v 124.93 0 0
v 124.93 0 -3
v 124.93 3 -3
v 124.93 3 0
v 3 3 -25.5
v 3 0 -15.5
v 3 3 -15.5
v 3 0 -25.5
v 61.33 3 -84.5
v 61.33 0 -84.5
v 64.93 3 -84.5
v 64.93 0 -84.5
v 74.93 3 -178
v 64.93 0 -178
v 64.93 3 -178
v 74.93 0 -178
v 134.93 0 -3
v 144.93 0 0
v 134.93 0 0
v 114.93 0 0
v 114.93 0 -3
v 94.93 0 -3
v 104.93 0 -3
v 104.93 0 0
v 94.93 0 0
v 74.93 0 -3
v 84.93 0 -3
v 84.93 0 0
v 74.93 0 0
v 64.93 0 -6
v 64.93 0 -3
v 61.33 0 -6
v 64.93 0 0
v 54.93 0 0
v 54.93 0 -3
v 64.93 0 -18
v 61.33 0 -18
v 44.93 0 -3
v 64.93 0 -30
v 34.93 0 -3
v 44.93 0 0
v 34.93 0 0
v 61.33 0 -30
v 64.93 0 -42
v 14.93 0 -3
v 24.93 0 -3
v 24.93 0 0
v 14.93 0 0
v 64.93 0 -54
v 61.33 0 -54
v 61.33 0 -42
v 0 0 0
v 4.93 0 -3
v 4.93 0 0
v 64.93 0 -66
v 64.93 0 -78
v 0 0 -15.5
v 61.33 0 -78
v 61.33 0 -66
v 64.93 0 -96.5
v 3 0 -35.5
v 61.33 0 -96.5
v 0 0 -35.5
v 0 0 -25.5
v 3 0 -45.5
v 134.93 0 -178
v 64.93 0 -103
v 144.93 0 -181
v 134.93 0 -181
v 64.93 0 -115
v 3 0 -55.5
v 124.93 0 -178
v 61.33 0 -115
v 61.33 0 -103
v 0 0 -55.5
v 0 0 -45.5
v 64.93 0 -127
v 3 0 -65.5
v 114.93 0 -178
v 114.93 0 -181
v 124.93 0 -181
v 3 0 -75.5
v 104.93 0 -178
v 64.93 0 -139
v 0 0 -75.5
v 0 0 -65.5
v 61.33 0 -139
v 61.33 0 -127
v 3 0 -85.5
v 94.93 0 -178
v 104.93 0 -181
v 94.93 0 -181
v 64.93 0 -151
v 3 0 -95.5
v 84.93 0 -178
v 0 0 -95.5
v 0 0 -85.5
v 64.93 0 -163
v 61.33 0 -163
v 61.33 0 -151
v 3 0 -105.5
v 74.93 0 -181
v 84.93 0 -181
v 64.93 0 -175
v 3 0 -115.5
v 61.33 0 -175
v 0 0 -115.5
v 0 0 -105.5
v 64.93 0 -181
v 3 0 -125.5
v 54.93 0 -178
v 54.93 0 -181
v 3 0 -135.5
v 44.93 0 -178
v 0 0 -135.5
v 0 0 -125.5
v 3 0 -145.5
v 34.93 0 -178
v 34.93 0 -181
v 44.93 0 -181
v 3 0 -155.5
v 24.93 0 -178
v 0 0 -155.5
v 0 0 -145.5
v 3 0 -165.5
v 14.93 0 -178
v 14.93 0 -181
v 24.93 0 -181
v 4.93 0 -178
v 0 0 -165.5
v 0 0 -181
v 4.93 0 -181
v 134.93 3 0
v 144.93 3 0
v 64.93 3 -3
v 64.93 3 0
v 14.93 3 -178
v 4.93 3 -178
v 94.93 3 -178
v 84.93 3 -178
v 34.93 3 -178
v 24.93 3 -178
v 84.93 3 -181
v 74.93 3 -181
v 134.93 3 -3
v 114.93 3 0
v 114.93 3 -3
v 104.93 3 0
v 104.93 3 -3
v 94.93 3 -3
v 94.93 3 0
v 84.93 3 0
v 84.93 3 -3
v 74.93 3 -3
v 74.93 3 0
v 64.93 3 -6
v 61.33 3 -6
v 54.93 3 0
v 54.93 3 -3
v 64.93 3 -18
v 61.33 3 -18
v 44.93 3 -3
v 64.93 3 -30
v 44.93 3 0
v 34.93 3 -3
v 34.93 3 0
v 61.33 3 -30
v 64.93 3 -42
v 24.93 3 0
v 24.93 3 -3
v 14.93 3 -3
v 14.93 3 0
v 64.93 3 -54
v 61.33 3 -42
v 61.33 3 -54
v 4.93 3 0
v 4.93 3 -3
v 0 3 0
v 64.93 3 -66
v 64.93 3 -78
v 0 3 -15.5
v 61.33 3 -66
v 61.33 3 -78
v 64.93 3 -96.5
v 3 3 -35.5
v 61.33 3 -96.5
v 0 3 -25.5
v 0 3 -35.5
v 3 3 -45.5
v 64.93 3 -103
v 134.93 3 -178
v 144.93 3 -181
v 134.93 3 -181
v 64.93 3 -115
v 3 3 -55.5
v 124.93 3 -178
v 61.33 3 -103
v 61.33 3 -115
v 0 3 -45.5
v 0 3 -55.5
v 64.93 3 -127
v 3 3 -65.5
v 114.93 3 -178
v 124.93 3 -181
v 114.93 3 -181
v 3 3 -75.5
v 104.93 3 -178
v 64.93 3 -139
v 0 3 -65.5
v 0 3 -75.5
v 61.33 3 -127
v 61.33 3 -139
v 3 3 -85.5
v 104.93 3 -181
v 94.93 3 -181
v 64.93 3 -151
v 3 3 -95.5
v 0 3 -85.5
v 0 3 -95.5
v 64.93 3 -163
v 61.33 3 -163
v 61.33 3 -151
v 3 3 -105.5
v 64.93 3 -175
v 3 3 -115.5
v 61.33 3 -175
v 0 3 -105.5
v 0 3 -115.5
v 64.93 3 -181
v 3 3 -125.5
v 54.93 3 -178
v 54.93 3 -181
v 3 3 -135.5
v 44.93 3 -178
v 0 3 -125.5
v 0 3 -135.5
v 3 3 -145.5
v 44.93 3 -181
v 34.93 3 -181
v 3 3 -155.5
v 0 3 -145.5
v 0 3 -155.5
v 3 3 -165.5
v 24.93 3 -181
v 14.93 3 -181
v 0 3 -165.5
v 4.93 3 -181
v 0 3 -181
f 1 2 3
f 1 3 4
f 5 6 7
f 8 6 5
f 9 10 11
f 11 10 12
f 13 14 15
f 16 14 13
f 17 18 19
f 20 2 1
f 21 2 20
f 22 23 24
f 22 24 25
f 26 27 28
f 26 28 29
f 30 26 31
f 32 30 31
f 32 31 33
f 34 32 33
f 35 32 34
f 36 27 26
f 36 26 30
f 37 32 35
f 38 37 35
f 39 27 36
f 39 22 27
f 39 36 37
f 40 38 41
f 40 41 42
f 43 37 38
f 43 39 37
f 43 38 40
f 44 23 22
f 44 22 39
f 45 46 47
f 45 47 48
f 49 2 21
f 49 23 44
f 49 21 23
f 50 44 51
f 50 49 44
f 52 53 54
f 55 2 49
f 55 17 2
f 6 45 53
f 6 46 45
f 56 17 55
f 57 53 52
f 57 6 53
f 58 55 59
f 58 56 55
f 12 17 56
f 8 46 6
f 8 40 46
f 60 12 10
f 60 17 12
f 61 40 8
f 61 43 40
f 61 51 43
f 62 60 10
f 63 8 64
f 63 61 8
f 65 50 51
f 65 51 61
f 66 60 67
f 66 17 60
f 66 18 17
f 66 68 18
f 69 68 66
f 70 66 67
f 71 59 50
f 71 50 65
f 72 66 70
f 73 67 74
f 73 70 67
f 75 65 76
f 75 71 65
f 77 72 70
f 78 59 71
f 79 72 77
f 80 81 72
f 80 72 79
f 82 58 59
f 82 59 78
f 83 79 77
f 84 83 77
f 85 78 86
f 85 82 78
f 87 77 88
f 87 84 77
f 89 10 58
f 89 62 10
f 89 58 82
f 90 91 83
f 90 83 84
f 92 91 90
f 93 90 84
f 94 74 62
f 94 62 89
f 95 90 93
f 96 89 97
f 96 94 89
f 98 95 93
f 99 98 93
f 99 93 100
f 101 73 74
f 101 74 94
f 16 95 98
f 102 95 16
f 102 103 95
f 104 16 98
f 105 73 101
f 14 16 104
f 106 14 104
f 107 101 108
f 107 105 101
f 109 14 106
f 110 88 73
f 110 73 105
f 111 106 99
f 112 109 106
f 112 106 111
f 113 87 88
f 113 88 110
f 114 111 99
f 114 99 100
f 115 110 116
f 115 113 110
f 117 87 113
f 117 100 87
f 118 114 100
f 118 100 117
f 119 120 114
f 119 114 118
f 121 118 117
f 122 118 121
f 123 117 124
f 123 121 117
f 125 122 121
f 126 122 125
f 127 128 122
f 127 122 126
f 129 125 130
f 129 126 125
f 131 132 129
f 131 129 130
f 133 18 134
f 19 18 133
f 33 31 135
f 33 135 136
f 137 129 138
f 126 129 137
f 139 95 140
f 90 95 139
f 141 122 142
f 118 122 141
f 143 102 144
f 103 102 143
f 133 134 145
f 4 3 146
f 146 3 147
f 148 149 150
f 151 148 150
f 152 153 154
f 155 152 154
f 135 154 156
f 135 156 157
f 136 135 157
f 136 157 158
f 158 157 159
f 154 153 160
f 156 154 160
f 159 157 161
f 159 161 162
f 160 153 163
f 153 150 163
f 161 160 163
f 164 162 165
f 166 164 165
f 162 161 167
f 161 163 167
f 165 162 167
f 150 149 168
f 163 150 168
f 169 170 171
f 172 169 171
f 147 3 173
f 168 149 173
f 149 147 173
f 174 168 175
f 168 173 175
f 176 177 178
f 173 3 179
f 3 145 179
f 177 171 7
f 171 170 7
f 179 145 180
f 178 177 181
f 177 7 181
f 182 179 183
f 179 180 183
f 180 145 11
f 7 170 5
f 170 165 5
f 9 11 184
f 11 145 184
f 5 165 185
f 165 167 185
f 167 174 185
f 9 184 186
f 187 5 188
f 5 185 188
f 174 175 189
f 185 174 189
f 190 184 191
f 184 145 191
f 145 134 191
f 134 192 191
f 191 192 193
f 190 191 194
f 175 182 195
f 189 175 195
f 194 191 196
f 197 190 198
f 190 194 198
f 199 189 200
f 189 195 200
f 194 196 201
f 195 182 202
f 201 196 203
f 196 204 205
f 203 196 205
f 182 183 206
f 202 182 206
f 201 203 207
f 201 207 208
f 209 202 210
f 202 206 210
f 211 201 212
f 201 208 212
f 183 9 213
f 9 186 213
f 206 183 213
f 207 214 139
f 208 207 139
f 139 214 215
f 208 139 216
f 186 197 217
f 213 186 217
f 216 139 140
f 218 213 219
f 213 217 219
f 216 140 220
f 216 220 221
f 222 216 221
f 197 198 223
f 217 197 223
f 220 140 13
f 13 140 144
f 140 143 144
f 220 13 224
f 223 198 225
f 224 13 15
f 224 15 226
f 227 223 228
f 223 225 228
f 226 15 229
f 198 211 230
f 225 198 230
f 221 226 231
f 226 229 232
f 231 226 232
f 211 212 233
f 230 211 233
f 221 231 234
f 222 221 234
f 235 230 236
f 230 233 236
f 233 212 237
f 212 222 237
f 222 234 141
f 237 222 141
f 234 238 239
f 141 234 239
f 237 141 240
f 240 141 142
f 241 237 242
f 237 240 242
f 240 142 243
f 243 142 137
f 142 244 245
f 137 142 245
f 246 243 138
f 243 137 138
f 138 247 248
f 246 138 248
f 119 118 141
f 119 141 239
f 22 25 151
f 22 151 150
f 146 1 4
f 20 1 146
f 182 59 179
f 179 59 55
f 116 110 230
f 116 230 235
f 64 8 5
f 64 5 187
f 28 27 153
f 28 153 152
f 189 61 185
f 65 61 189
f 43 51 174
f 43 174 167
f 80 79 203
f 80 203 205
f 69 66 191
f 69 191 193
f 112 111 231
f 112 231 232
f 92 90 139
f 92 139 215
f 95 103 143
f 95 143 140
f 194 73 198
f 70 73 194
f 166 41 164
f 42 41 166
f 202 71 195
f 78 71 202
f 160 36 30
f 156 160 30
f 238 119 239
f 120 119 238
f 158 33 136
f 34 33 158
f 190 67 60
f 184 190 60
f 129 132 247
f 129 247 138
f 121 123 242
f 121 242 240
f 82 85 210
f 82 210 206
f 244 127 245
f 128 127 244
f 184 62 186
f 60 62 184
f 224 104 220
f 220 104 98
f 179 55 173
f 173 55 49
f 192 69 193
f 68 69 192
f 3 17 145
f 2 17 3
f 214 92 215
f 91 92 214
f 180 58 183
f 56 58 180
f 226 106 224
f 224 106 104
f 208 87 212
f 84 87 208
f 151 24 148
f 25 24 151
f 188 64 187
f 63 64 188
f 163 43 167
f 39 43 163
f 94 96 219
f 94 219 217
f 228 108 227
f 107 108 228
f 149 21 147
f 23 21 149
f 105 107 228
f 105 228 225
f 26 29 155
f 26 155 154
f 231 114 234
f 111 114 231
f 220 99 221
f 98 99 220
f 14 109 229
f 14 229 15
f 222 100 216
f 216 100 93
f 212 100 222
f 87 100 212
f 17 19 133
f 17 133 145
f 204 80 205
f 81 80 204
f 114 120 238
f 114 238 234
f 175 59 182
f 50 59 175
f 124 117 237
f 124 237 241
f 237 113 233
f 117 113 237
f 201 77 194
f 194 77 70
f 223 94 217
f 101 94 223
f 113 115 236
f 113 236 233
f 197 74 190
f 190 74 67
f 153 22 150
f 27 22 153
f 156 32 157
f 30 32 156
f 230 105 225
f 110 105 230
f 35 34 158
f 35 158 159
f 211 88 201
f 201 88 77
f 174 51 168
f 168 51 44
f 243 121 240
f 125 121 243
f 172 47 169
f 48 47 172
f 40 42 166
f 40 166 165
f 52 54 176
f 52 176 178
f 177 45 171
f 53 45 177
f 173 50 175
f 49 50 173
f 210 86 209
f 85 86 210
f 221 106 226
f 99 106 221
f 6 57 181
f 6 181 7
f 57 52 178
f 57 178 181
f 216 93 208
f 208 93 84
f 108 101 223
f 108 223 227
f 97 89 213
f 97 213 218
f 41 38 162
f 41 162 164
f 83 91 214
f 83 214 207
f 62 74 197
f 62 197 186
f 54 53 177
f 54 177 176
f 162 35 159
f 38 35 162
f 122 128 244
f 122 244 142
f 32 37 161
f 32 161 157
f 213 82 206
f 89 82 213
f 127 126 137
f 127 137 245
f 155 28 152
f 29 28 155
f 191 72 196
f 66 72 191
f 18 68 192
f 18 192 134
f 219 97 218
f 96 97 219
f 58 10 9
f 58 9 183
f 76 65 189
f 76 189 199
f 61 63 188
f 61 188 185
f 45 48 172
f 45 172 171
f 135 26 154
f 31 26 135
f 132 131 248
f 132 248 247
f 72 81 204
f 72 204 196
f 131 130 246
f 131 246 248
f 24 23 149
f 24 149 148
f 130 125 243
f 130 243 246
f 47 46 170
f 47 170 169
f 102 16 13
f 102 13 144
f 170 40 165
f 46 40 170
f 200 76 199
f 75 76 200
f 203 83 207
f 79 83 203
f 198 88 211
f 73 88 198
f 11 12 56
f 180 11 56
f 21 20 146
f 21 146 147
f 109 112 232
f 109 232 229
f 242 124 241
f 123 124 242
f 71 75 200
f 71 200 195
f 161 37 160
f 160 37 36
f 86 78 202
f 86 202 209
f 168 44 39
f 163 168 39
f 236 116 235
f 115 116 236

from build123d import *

# Parameters (mm, degrees)
BOSS_EXTRUDE1_DEPTH = 3
SKETCH2_W           = 3.6
SKETCH2_H           = 12
SKETCH2_H_2         = 6.5
CUT_EXTRUDE1_DEPTH  = 10


with BuildPart() as part:
    # Sketch1 → Boss-Extrude1 (new body)
    with BuildSketch(Plane(origin=(0, 0, 0), x_dir=(1, 0, 0), z_dir=(0, 1, 0))):
        Polygon((0, 0), (0, 15.5), (3, 15.5), (3, 25.5), (0, 25.5), (0, 35.5), (3, 35.5), (3, 45.5), (0, 45.5), (0, 55.5), (3, 55.5), (3, 65.5), (0, 65.5), (0, 75.5), (3, 75.5), (3, 85.5), (0, 85.5), (0, 95.5), (3, 95.5), (3, 105.5), (0, 105.5), (0, 115.5), (3, 115.5), (3, 125.5), (0, 125.5), (0, 135.5), (3, 135.5), (3, 145.5), (0, 145.5), (0, 155.5), (3, 155.5), (3, 165.5), (0, 165.5), (0, 181), (4.93, 181), (4.93, 178), (14.93, 178), (14.93, 181), (24.93, 181), (24.93, 178), (34.93, 178), (34.93, 181), (44.93, 181), (44.93, 178), (54.93, 178), (54.93, 181), (64.93, 181), (64.93, 178), (74.93, 178), (74.93, 181), (84.93, 181), (84.93, 178), (94.93, 178), (94.93, 181), (104.93, 181), (104.93, 178), (114.93, 178), (114.93, 181), (124.93, 181), (124.93, 178), (134.93, 178), (134.93, 181), (144.93, 181), (144.93, 0), (134.93, 0), (134.93, 3), (124.93, 3), (124.93, 0), (114.93, 0), (114.93, 3), (104.93, 3), (104.93, 0), (94.93, 0), (94.93, 3), (84.93, 3), (84.93, 0), (74.93, 0), (74.93, 3), (64.93, 3), (64.93, 0), (54.93, 0), (54.93, 3), (44.93, 3), (44.93, 0), (34.93, 0), (34.93, 3), (24.93, 3), (24.93, 0), (14.93, 0), (14.93, 3), (4.93, 3), (4.93, 0), align=None)
    extrude(amount=BOSS_EXTRUDE1_DEPTH)

    # Sketch2 → Cut-Extrude1 (cut)
    with BuildSketch(Plane.XZ):
        with Locations((63.13, -36)):
            Rectangle(SKETCH2_W, SKETCH2_H)
        with Locations((63.13, -12)):
            Rectangle(SKETCH2_W, SKETCH2_H)
        with Locations((63.13, -169)):
            Rectangle(SKETCH2_W, SKETCH2_H)
        with Locations((63.13, -145)):
            Rectangle(SKETCH2_W, SKETCH2_H)
        with Locations((63.13, -121)):
            Rectangle(SKETCH2_W, SKETCH2_H)
        with Locations((63.13, -99.75)):
            Rectangle(SKETCH2_W, SKETCH2_H_2)
        with Locations((63.13, -81.25)):
            Rectangle(SKETCH2_W, SKETCH2_H_2)
        with Locations((63.13, -60)):
            Rectangle(SKETCH2_W, SKETCH2_H)
    extrude(amount=-CUT_EXTRUDE1_DEPTH, mode=Mode.SUBTRACT)


solid = part.part
